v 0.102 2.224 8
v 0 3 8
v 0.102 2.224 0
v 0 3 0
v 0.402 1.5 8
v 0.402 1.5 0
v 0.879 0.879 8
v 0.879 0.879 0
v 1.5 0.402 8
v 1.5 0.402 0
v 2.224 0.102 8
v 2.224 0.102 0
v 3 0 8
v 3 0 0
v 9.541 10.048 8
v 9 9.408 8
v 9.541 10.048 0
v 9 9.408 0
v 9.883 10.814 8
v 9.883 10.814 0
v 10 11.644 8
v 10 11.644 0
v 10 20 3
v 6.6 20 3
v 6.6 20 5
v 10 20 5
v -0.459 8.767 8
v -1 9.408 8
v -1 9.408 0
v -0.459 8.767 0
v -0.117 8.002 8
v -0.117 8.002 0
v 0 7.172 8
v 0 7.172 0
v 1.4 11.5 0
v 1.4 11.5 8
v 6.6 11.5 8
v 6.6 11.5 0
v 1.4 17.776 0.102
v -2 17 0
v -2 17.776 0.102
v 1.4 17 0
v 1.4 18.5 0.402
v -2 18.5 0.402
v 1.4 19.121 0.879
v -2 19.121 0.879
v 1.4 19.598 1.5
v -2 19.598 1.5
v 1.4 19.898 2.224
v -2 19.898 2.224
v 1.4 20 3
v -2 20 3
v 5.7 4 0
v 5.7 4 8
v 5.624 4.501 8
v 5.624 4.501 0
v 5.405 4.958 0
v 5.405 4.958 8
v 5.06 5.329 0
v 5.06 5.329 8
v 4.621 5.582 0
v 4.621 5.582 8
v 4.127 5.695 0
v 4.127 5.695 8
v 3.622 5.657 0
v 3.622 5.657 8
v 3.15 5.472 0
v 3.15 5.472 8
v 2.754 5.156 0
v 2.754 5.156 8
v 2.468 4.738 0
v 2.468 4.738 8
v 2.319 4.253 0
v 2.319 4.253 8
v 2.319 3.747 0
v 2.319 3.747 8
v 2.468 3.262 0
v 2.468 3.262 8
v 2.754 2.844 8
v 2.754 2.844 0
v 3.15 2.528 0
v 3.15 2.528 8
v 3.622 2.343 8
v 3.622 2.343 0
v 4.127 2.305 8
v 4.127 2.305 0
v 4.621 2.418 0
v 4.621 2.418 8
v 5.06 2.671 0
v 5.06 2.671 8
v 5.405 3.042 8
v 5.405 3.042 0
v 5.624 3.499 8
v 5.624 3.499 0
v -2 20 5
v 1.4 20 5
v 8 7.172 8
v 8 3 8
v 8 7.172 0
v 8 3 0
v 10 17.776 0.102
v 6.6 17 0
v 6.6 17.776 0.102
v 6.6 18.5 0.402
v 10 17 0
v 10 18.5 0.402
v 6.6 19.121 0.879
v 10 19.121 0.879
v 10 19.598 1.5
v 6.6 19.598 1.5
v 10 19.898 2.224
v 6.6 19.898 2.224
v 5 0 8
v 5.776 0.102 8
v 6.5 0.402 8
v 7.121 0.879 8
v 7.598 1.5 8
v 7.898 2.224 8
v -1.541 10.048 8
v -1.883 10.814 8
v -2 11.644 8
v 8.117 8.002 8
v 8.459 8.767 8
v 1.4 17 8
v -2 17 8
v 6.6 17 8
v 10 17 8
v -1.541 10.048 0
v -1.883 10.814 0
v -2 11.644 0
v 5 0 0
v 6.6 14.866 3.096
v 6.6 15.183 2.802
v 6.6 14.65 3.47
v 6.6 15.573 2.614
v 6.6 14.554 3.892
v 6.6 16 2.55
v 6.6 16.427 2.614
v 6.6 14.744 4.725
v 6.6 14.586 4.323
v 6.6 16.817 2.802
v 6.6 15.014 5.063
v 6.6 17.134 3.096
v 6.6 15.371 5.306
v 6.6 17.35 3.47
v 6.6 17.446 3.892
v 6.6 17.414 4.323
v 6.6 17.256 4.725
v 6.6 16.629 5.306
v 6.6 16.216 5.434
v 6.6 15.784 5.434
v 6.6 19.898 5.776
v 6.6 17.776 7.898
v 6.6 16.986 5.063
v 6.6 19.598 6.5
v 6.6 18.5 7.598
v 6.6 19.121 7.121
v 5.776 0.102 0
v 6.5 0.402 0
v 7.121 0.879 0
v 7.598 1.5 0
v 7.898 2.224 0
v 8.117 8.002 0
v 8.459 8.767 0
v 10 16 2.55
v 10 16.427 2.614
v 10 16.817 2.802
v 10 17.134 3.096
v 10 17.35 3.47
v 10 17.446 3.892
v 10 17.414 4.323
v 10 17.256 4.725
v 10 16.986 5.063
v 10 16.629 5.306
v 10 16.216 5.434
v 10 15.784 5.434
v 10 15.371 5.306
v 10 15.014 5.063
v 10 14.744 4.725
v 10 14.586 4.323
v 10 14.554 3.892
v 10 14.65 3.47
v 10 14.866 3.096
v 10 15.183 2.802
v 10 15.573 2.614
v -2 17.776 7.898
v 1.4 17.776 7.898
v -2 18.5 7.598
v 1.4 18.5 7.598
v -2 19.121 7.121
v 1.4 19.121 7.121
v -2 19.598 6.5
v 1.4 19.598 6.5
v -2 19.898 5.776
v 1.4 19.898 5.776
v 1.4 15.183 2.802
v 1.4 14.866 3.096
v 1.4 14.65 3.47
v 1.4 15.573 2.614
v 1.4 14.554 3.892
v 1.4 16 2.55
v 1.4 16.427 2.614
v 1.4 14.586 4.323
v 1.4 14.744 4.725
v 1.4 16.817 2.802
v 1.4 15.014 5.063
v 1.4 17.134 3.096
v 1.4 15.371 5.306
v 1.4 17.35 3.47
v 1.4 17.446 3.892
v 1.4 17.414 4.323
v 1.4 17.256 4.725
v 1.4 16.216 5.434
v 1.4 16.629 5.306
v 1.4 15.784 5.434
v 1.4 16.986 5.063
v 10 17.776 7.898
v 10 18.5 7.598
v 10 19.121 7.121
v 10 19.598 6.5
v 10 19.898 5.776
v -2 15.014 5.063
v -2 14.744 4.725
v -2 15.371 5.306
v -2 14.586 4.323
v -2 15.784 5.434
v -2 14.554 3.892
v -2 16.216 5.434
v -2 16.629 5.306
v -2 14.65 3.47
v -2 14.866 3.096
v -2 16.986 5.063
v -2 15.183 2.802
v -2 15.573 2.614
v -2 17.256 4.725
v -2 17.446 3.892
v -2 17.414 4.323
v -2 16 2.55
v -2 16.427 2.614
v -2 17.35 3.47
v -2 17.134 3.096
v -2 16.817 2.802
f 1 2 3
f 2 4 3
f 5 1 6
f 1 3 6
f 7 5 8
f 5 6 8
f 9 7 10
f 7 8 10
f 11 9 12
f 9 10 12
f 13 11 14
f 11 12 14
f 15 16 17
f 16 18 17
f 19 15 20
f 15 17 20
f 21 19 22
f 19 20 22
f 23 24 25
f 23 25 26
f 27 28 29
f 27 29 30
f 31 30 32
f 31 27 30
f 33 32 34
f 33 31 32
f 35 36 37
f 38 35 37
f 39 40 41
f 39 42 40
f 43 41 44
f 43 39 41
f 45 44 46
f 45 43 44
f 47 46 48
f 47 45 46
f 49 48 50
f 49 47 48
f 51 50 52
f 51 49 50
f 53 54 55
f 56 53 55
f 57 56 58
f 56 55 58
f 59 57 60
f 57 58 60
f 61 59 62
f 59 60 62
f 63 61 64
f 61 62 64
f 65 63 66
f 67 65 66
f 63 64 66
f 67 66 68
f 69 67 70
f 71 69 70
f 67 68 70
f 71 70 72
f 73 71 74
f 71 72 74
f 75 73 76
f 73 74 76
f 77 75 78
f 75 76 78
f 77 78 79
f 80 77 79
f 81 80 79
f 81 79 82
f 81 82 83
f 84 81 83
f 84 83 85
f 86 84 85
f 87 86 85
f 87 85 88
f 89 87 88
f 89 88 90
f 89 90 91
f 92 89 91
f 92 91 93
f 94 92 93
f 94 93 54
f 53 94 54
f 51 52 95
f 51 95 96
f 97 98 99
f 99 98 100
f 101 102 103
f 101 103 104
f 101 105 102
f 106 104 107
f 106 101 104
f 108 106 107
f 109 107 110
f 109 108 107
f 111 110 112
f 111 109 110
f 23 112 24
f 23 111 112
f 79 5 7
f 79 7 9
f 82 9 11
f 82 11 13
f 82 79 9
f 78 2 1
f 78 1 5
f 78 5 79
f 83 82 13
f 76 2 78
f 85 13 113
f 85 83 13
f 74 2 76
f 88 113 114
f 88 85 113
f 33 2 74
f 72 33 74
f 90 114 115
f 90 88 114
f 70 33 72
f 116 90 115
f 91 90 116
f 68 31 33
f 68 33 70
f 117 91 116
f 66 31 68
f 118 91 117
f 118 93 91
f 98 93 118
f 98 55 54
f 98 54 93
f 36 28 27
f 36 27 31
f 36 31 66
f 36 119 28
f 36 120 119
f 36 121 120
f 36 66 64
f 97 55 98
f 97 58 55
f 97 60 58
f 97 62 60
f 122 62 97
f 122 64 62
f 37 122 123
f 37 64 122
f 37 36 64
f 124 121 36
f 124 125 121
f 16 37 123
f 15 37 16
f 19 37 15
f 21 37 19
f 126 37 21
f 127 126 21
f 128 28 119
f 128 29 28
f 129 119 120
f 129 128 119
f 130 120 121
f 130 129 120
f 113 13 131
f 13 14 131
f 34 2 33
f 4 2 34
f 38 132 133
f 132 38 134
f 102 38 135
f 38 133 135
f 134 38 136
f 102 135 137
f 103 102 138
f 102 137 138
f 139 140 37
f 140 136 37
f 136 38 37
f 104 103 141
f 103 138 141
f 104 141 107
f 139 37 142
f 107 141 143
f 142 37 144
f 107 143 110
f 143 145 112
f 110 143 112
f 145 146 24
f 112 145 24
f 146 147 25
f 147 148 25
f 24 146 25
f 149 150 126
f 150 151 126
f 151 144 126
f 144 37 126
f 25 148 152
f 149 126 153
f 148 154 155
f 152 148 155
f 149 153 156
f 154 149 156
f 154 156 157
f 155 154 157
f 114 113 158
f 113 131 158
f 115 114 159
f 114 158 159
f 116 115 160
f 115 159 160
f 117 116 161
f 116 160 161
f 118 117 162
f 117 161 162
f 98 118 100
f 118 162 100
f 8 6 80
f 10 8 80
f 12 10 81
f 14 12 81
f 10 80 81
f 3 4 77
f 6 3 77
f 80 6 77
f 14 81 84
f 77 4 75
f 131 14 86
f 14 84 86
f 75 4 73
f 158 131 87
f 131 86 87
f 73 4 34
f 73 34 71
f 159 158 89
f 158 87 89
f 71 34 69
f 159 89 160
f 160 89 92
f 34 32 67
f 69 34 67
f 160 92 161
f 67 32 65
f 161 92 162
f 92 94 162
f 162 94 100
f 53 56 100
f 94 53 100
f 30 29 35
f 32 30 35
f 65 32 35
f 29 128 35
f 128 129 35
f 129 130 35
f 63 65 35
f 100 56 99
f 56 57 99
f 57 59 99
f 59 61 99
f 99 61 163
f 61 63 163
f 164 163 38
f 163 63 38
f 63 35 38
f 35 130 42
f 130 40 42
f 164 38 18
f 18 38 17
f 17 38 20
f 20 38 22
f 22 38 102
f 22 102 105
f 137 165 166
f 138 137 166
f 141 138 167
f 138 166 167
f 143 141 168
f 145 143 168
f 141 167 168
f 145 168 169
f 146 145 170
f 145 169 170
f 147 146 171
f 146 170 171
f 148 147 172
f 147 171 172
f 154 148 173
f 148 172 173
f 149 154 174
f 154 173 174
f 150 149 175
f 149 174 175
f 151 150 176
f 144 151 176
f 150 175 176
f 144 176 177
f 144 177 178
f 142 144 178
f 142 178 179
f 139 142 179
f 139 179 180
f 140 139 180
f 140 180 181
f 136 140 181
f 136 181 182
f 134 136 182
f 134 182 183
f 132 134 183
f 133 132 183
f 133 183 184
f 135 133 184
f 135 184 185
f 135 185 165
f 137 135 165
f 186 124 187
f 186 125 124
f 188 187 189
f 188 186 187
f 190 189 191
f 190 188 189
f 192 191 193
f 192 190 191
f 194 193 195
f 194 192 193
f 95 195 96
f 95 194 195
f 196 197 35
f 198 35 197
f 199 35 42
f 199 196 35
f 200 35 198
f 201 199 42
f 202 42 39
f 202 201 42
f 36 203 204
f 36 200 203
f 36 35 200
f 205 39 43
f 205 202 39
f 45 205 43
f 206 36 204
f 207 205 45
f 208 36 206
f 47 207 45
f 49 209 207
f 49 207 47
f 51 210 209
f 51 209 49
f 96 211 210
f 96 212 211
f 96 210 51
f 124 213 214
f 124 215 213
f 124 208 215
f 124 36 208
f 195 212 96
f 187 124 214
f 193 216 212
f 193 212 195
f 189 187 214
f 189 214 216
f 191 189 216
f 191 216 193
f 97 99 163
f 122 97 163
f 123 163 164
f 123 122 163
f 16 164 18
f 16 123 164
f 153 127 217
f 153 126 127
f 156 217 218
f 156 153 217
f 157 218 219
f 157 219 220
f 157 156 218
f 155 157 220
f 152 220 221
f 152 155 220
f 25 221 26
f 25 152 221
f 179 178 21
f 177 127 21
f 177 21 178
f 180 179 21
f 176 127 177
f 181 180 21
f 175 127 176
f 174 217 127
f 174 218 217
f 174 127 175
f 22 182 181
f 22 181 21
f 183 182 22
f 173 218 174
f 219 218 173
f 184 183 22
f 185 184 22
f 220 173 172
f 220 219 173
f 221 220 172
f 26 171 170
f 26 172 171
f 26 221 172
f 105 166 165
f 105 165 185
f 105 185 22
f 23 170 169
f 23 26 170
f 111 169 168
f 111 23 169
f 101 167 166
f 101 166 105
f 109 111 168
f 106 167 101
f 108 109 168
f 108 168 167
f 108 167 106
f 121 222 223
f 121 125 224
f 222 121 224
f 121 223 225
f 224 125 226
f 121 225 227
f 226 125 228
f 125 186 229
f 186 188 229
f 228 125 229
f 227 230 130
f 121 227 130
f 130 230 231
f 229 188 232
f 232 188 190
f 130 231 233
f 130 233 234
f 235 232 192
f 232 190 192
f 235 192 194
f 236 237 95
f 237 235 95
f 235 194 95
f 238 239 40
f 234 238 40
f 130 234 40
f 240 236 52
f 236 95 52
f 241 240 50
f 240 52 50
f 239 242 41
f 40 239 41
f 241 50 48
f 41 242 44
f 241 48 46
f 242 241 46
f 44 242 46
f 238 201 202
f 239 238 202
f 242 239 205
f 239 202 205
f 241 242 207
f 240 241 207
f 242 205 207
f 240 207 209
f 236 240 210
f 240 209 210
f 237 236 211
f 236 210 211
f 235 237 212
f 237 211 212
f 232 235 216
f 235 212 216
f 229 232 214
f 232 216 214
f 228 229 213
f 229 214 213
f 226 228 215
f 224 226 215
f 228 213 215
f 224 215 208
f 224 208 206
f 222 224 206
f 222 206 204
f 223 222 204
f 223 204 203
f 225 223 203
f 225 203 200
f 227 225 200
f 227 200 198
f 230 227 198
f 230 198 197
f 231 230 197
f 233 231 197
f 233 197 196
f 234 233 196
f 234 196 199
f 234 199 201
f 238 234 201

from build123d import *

# Parameters (mm, degrees)
SKETCH_1_W          = 8
SKETCH_1_H          = 8
EXTRUDE_1_DEPTH     = 20
SKETCH_2_R          = 1.7
CUT_EXTRUDE_1_DEPTH = 23.978250586
SKETCH_4_W          = 2
SKETCH_4_H          = 8
EXTRUDE_3_DEPTH     = 10
SKETCH_5_W          = 5.2
SKETCH_5_H          = 8.5
CUT_EXTRUDE_2_DEPTH = 24.748684174
FILLET_1_R          = 3
SKETCH_6_R          = 1.45
CUT_EXTRUDE_3_DEPTH = 25.657656012
FILLET_2_R          = 3


with BuildPart() as part:
    # 草图1 → 凸台-拉伸1 (new body)
    with BuildSketch(Plane(origin=(0, 0, 0), x_dir=(1, 0, 0), z_dir=(0, 1, 0))):
        with Locations((4, -4)):
            Rectangle(SKETCH_1_W, SKETCH_1_H)
    extrude(amount=EXTRUDE_1_DEPTH)

    # 草图2 → 切除-拉伸1 (cut, through all)
    with BuildSketch(Plane.XY.offset(8)):
        with Locations((4, 4)):
            Circle(SKETCH_2_R)
    extrude(amount=-CUT_EXTRUDE_1_DEPTH, mode=Mode.SUBTRACT)

    # 草图4 → 凸台-拉伸3 (add)
    with BuildSketch(Plane(origin=(0, 20, 0), x_dir=(1, 0, 0), z_dir=(0, 1, 0))):
        with Locations((-1, -4)):
            Rectangle(SKETCH_4_W, SKETCH_4_H)
        with Locations((9, -4)):
            Rectangle(SKETCH_4_W, SKETCH_4_H)
    extrude(amount=-EXTRUDE_3_DEPTH)

    # 草图5 → 切除-拉伸2 (cut, through all)
    with BuildSketch(Plane.XY.offset(8)):
        with Locations((4, 15.75)):
            Rectangle(SKETCH_5_W, SKETCH_5_H)
    extrude(amount=-CUT_EXTRUDE_2_DEPTH, mode=Mode.SUBTRACT)

    # 圆角1
    # the kernel refuses this fillet: 3 mm, written as the material it adds along each edge
    with BuildSketch(Plane(origin=(8, 10, 8), x_dir=(0, -1, 0), z_dir=(0, 0, -1))) as fillet_1_piece_1:
        with BuildLine():
            CenterArc((2.828427125, -3), FILLET_1_R, 90, 70.528779366)
            Line((0, -2), (-0.056568542, -1.98))
            ThreePointArc((-0.056568542, -1.98), (-0.06, -1), (-0.06, 0))
            Line((-0.06, 0), (0, 0.06))
            Line((0, 0.06), (2.828427125, 0.06))
            Line((2.828427125, 0.06), (2.828427125, 0))
        make_face()
    extrude(amount=8)
    with BuildSketch(Plane(origin=(0, 10, 8), x_dir=(-1, 0, 0), z_dir=(0, 0, -1))) as fillet_1_piece_2:
        with BuildLine():
            CenterArc((3, -2.828427125), FILLET_1_R, 109.471220634, 70.528779366)
            Line((0, -2.828427125), (-0.06, -2.828427125))
            Line((-0.06, -2.828427125), (-0.06, 0))
            Line((-0.06, 0), (0, 0.06))
            ThreePointArc((0, 0.06), (1, 0.06), (1.98, 0.056568542))
            Line((1.98, 0.056568542), (2, 0))
        make_face()
    extrude(amount=8)

    # 草图6 → 切除-拉伸3 (cut, through all)
    with BuildSketch(Plane(origin=(10, 0, 0), x_dir=(0, 0, -1), z_dir=(1, 0, 0))):
        with Locations((-4, 16)):
            Circle(SKETCH_6_R)
    extrude(amount=-CUT_EXTRUDE_3_DEPTH, mode=Mode.SUBTRACT)

    # 圆角2
    fillet_2_edges = [part.edges().sort_by_distance(p)[0] for p in [
        (8.3, 20, 0),
        (-2, 10, 4),
        (10, 10, 4),
        (-0.3, 20, 0),
        (8.3, 20, 8),
        (8, 0, 4),
        (0, 0, 4),
        (-0.3, 20, 8),
    ]]
    fillet(fillet_2_edges, radius=FILLET_2_R)


solid = part.part
